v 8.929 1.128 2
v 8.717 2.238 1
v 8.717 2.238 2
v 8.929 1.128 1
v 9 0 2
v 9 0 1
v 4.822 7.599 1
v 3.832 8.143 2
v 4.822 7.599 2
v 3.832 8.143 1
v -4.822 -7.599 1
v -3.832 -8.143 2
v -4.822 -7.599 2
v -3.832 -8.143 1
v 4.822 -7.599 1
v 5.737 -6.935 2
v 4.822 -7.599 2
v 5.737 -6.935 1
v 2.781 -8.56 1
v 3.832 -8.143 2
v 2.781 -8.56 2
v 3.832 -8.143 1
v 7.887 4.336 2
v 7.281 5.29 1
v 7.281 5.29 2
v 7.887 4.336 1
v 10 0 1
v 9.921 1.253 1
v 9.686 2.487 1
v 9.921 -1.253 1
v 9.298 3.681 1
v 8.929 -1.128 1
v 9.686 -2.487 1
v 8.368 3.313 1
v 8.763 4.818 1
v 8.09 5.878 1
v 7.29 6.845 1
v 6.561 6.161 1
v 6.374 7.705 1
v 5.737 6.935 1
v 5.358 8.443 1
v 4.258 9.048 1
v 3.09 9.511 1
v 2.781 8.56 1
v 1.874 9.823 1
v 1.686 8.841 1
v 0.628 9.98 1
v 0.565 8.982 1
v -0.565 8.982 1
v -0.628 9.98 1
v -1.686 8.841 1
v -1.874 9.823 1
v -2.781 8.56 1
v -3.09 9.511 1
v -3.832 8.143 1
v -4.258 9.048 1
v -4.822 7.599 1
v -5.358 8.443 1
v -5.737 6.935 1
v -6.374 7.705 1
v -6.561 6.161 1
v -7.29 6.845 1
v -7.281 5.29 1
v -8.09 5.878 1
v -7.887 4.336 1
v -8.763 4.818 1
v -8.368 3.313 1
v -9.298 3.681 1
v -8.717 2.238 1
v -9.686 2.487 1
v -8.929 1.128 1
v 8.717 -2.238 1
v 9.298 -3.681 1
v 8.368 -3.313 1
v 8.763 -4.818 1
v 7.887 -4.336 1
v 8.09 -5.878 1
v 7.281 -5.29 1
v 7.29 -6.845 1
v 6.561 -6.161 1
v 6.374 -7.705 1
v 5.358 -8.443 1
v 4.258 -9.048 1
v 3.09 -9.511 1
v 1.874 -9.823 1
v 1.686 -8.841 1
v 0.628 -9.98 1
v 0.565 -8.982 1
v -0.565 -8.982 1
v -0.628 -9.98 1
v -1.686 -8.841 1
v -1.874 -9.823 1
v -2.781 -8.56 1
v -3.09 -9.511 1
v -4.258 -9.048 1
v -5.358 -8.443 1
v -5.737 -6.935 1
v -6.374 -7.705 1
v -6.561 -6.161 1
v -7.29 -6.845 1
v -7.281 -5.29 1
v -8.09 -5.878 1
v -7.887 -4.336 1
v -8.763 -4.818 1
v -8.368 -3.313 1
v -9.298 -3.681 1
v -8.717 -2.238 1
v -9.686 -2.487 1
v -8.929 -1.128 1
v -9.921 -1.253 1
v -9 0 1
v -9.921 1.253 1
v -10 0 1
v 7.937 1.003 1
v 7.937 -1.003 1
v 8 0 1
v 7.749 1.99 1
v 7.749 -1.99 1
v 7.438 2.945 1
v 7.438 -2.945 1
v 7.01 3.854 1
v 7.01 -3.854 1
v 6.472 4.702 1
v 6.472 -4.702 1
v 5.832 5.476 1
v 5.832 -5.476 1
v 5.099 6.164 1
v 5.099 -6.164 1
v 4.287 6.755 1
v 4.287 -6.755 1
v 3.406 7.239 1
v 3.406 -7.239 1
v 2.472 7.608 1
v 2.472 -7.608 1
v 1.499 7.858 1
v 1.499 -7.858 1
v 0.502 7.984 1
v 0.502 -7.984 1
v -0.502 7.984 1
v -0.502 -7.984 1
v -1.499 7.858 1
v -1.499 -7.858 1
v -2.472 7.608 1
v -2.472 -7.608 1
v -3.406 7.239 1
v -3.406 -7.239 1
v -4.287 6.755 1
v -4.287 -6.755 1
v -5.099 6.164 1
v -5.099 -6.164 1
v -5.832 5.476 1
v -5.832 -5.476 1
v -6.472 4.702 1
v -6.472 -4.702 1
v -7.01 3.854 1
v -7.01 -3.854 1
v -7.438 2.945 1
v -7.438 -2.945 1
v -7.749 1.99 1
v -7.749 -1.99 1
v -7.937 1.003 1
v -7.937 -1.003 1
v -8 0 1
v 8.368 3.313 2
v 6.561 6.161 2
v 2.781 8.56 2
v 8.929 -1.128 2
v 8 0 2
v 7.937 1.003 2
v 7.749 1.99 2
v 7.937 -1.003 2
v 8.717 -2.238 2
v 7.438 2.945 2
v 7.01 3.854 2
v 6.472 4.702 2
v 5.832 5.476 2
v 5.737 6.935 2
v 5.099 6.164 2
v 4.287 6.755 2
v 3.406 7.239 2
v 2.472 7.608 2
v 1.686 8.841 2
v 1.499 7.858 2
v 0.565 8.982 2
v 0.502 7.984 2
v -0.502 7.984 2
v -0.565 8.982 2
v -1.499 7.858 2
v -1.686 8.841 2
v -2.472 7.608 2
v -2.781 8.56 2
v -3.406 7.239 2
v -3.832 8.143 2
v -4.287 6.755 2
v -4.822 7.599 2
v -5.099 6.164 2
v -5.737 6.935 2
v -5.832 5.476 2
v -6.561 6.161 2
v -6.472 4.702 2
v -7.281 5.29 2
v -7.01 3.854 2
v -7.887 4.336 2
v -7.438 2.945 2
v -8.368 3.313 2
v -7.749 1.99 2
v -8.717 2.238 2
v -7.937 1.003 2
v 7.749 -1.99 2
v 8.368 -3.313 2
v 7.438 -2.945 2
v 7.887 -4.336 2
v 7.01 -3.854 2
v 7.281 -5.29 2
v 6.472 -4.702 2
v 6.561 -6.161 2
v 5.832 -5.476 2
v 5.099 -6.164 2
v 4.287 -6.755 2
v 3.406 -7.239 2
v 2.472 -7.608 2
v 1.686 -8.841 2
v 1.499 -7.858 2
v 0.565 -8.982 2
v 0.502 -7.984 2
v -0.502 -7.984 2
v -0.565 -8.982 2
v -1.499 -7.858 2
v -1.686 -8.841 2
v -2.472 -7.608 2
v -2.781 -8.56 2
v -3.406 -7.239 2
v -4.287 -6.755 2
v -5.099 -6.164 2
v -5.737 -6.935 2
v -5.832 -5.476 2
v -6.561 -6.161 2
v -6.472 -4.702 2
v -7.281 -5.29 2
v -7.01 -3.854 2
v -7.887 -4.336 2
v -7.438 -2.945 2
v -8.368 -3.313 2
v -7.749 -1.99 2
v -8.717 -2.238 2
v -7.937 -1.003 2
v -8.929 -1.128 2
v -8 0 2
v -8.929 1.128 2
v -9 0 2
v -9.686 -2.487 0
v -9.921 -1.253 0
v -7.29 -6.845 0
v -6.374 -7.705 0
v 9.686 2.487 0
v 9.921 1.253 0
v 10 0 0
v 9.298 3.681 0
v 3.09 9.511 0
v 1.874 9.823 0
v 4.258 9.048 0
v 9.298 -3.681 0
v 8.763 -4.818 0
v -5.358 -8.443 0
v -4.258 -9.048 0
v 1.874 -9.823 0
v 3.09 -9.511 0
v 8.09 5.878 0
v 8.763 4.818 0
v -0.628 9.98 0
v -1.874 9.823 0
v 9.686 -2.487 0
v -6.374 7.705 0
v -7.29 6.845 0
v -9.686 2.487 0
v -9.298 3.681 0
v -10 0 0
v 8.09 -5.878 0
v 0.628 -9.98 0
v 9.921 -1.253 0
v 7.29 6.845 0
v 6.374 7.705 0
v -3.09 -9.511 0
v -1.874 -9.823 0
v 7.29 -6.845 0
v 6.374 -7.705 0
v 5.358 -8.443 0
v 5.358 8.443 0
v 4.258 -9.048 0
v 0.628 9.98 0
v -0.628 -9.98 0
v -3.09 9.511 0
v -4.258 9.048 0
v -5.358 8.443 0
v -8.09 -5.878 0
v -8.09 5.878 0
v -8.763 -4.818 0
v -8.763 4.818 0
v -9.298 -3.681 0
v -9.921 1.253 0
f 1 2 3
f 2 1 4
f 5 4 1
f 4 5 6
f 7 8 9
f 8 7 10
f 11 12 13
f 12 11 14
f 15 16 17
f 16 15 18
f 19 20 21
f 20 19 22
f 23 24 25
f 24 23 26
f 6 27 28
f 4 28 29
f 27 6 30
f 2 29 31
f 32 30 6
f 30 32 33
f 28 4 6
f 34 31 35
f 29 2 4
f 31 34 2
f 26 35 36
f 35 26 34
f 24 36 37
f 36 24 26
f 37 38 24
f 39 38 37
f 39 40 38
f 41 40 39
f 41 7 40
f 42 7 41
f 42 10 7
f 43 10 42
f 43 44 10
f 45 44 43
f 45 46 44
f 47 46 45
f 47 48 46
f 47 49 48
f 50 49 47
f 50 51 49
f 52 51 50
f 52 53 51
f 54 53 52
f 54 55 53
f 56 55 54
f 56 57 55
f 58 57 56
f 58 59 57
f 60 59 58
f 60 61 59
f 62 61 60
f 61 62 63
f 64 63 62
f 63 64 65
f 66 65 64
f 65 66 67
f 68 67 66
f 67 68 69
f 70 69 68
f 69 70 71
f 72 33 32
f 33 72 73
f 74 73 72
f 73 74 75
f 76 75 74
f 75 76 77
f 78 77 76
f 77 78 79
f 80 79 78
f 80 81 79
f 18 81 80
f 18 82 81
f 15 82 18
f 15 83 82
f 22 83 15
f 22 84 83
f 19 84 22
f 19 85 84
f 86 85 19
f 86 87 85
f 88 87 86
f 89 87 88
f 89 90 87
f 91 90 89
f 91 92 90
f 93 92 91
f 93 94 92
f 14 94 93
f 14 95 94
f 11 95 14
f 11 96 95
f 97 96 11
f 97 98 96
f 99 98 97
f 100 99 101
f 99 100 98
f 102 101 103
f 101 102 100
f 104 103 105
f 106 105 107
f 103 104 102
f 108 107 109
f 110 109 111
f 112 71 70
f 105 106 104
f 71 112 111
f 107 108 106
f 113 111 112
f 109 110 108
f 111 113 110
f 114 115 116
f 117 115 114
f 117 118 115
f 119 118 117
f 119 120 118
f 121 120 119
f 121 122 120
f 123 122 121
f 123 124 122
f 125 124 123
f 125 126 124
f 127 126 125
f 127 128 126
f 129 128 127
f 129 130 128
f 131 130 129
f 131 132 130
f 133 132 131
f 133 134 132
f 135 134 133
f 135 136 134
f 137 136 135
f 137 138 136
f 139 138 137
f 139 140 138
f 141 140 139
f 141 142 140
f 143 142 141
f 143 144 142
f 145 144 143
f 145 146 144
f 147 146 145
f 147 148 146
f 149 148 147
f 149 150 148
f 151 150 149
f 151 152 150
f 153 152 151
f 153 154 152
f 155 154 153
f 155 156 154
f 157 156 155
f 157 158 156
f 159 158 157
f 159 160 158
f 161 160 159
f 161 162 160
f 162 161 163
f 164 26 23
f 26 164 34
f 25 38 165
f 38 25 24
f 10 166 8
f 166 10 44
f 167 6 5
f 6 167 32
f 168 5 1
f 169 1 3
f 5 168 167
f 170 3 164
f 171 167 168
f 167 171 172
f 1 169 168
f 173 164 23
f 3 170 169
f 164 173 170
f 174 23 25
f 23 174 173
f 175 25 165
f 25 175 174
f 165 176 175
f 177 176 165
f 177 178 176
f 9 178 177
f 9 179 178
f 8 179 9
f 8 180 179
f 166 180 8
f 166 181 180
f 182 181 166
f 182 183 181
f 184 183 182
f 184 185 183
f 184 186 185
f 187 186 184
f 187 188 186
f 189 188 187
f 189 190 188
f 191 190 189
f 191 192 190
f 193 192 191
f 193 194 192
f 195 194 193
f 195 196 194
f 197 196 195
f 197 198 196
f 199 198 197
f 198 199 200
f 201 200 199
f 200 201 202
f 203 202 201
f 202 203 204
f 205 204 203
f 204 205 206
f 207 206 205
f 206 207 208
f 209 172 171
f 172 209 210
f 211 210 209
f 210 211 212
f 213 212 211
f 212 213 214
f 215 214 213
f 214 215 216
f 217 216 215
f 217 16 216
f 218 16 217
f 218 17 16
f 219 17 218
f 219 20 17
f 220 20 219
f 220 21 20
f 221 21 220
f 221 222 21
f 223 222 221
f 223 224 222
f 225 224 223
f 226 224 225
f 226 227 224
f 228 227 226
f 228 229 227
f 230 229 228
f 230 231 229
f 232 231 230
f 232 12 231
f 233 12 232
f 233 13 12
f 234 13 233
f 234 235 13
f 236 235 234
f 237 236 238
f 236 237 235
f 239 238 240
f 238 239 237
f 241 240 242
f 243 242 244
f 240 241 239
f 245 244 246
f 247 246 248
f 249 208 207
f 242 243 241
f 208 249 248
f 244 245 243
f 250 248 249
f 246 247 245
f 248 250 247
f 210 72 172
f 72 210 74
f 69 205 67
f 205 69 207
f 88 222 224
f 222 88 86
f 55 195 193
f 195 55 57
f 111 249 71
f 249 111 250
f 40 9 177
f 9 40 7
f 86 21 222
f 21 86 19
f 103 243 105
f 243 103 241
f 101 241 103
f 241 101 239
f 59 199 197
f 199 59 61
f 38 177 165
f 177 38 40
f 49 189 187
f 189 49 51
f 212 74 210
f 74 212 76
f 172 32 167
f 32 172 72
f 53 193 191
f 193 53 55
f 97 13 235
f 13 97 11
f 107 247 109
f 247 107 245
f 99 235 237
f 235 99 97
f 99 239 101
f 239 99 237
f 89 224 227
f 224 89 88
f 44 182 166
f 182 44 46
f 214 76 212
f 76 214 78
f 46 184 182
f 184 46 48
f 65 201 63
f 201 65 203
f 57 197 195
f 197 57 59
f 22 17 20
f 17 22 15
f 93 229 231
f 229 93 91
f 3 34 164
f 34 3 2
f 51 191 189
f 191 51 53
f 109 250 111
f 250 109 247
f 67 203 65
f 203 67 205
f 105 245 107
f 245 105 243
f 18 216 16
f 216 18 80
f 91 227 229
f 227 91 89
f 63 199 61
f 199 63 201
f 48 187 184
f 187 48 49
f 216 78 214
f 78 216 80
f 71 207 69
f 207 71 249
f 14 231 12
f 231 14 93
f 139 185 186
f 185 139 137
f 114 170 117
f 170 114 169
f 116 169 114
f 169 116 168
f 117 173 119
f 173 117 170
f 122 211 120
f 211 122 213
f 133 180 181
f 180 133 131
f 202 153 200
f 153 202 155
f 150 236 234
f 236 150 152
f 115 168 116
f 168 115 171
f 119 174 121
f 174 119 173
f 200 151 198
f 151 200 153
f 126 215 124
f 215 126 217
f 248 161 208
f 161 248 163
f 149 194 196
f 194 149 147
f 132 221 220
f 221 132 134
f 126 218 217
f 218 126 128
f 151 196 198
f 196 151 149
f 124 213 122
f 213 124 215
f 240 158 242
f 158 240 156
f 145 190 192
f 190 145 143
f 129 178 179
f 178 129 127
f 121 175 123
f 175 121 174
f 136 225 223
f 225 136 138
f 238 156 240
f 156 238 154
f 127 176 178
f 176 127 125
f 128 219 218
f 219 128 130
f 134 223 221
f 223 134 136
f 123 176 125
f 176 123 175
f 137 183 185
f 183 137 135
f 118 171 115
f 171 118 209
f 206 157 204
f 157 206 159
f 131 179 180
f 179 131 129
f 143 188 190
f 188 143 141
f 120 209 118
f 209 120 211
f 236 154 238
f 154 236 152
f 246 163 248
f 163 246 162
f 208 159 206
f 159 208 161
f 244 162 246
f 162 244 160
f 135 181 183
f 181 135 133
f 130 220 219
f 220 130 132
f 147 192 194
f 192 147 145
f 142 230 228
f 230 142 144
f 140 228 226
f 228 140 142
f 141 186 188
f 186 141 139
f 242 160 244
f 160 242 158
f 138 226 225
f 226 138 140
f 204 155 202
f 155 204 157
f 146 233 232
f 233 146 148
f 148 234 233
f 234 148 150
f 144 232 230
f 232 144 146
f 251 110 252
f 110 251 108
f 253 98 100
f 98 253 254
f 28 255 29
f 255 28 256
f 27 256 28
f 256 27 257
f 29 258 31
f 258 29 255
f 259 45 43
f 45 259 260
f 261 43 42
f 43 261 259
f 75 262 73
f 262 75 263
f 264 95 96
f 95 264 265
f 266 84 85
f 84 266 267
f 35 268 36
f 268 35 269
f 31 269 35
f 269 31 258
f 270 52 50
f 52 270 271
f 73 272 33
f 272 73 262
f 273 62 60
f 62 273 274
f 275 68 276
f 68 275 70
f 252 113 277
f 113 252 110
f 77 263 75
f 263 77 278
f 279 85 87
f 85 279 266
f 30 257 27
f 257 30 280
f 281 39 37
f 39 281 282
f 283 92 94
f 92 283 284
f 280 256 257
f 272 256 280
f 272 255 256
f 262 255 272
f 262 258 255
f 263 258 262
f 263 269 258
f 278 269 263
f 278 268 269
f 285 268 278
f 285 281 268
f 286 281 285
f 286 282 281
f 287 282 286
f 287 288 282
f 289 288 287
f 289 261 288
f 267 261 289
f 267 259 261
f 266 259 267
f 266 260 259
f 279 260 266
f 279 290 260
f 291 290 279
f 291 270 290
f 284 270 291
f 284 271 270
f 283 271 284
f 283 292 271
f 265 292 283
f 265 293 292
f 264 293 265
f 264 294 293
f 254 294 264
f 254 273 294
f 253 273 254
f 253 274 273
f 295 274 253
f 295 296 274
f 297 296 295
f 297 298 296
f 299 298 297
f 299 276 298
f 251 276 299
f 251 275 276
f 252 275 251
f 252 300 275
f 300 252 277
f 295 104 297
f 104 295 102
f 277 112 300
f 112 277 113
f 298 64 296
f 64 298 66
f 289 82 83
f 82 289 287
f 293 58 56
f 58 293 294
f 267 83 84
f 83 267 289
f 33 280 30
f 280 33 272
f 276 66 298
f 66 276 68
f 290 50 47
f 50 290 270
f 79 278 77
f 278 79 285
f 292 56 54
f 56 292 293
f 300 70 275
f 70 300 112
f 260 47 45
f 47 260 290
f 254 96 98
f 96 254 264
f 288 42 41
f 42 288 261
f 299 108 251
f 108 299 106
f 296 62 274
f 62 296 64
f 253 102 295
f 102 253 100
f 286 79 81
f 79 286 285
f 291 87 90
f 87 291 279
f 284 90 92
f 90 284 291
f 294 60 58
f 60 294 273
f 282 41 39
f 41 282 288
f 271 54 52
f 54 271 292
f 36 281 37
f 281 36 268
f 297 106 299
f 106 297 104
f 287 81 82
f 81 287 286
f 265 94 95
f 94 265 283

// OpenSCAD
// file: pulley608lib.scad
//
// pulley608
//
// (c)Jeremie Francois (jeremie.francois@gmail.com)
//	http://www.thingiverse.com/MoonCactus
//	http://betterprinter.blogspot.com
//
// Licence: Attribution - Share Alike - Creative Commons
//

tol=0.05;
$fn=50;

// Bearing dimensions
brg_608_th=7;
brg_608_outer_d=22;
brg_608_inner_d=8;
brg_608_inner_shoulder_d=10;

// Diameter of the pulley within the groove
pulley_cable_d= brg_608_outer_d+2*3;
pulley_shoulder= 2; // lateral shoulder thickness

nail_d= 4.6; // your nail or screw diameter (better keep it tight)

brg_tightness=-0.4; // optional additional friction to press-fit the bearing in place (inside=cover & outside=pulley) - or negative to give some free play

// The leg to get a second point of attachment for the cover/internal axis
cover_leg_outer_d= 8; // zero or negative to hide the leg
cover_leg_inner_d= 3;

// The cover properties
cover_angular_size= 70; // how wide is the cover in degrees, zero to disable
cover_gap=0.6; // gap between the cover and the bearing
cover_th= pulley_shoulder; // thickness of the cover plate


// These are not really parameters
reinforced_legs=true; // add longitudinal paths for slicers
pulley_d= pulley_cable_d+brg_608_th;
pulley_overhang_correction= pulley_d/30; // controls how deep is the groove of the pulley

module debug_bearing_608()
{
	%difference()
	{
		cylinder(r= brg_608_outer_d/2, h=brg_608_th);
		translate([0,0,-tol]) cylinder(r= brg_608_inner_d/2, h=brg_608_th + 2*tol);
		translate([0,0,-tol]) cylinder(r= 17.5/2, h=0.66);
		translate([0,0,brg_608_th-0.66+tol]) cylinder(r= 17.5/2, h=0.66);
	}
}

//translate([0,0,pulley_shoulder]) debug_bearing_608();

module pulley()
{
	difference()
	{
		cylinder(r= pulley_d/2-pulley_overhang_correction, h= pulley_shoulder*2 + brg_608_th);
		translate([0,0,-tol]) cylinder(r= brg_608_outer_d/2 - pulley_shoulder, h= pulley_shoulder+2*tol);
		
		translate([0,0,pulley_shoulder-tol]) cylinder(r= brg_608_outer_d/2-brg_tightness/2, h= brg_608_th+pulley_shoulder+2*tol);

		translate([0, 0, brg_608_th/2 + pulley_shoulder])
		rotate_extrude(convexity = 10)
			translate([pulley_d/2, 0,0])
				circle(r=brg_608_th/2);
	}
}

module cover_sector()
{
	// Use this to define how far the cover goes (here it defines a quadrant)
	translate([0,0,-1])
	hull()
	{
		for(a=[-cover_angular_size/2:30:cover_angular_size/2-0.01])
			rotate([0,0,a])
				cube([0.1,pulley_d/2+brg_608_th+3,brg_608_th+2*cover_th+2*cover_gap+3]);
		rotate([0,0,cover_angular_size/2])
			cube([0.1,pulley_d/2+brg_608_th+3,brg_608_th+2*cover_th+2*cover_gap+3]);
	}
}

cover_r= pulley_d/2+cover_gap;
//
// To reduce the gap between the cover and the pulley that results from the pulley overhang correction, you could define cover_r as:
//   cover_r= pulley_d/2+cover_gap-pulley_overhang_correction;
// But you would have to print the cover with support then, because it adds overhangs on the cover in return...
//
leg_outer_pos= pulley_d/2 + (brg_608_th/2+pulley_shoulder) + cover_leg_outer_d/2 + cover_gap;
module cover(bottom_side=true)
{
	color([0.15,0.5,0.25])
	difference()
	{
		union()
		{
			// The hollow bearing axis
			if(bottom_side==true)
			{
				cylinder(r=brg_608_inner_d/2 + brg_tightness/2, h=pulley_shoulder+brg_608_th+pulley_shoulder*0+cover_th+cover_gap);
			}
			// Bottom shoulder
			cylinder(r=brg_608_inner_shoulder_d/2, h=pulley_shoulder+cover_th+cover_gap);
			// Base plate
			hull()
			{
				cylinder(r=brg_608_inner_d/2, h=cover_th);
				if(cover_angular_size>0)
				{
					intersection()
					{
						cover_sector();
						cylinder(r= (pulley_d)/2+cover_gap+pulley_shoulder, h= cover_th);
					}
				}
			}

			// Cover outer leg
			if(cover_leg_outer_d>0)
			{
				difference()
				{
					union()
					{
						hull()
						{
							cylinder(r=brg_608_inner_d/2, h=cover_th);
							translate([0,leg_outer_pos,0])
									cylinder(r= cover_leg_outer_d/2,h= cover_th);
						}
						if(bottom_side==false)
						{
							translate([0,leg_outer_pos,0])
									cylinder(r= cover_leg_outer_d/2,h= cover_th+cover_gap*2+pulley_shoulder*2+brg_608_th);
						}
					}
					// Leg outer hole
					translate([0,leg_outer_pos,-tol])
							cylinder(r= cover_leg_inner_d/2,h= cover_th+cover_gap*2+pulley_shoulder*2+brg_608_th+2*tol);
				}
			}

			if(cover_angular_size>0 && bottom_side)
			{
				intersection()
				{
					cover_sector();
					difference()
					{
						hull()
						{
							//Rounded cover
							translate([0,0,pulley_shoulder+brg_608_th/2+cover_th+cover_gap])
								rotate_extrude(convexity = 10)
									translate([pulley_d/2, 0,0])
										circle(r=brg_608_th/2+pulley_shoulder);
							//Base junction
							translate([0,0,pulley_shoulder/2])
								rotate_extrude(convexity = 10)
									translate([pulley_d/2+pulley_shoulder, 0,0])
										circle(r=pulley_shoulder/2);
						}
						translate([0,0,-tol]) cylinder(r=cover_r, h=pulley_shoulder+brg_608_th+pulley_shoulder+cover_th+cover_gap+2*tol);

						translate([0, 0, brg_608_th/2 + pulley_shoulder + cover_th + cover_gap])
						rotate_extrude(convexity = 10)
							translate([pulley_d/2, 0,0])
								circle(r=brg_608_th/2);

					}
				}
			}
		}
		// The bearing nail/screw axis
		translate([0,0,-tol]) cylinder(r=nail_d/2, h=pulley_shoulder+brg_608_th+pulley_shoulder+cover_th+cover_gap+2*tol);
		if(reinforced_legs)
		{
			// Very thin longitudinal tubes to make sur the slicers will do something robust here
			for(i=[-brg_608_inner_d/2:brg_608_inner_d/10:brg_608_inner_d/2])
				translate([i,-10,cover_th/2])
					rotate([-90,0,0])
						cylinder(r=0.1,h= leg_outer_pos+20, $fn=4);
		}
	}
}
module cover_bottom()
{
	cover(true);
}
module cover_top()
{
	cover(false);
}


module show(show_bearing=true, show_pulley=true, show_coverb=true, show_covert=true)
{
	if(show_bearing)
		translate([0,0,cover_th+cover_gap+pulley_shoulder])
			debug_bearing_608();
	if(show_pulley)
		translate([0,0,cover_th+cover_gap])
			pulley();
	if(show_coverb)
		cover_bottom();
	if(show_covert)
		color([0.8,0.3,0.3]) scale([1,1,-1])
			translate([0,0,-(cover_th*2+cover_gap*2+pulley_shoulder*2+brg_608_th)])
				cover_top();
}

// Combined view:
//	show(false,true,false,false);
// Else call separately the elements:
//
// pulley();
// cover_bottom();
// cover_top();
// main file
include <pulley608lib.scad>

$fn=50;

thickness=1;
translate([0,0,thickness]) difference()
{
    cylinder(r= brg_608_outer_d/2 - pulley_shoulder, h= thickness);
    cylinder(r= brg_608_outer_d/2 - pulley_shoulder-1, h= thickness);

}

cylinder(r= brg_608_outer_d/2 - pulley_shoulder+1, h= thickness);
